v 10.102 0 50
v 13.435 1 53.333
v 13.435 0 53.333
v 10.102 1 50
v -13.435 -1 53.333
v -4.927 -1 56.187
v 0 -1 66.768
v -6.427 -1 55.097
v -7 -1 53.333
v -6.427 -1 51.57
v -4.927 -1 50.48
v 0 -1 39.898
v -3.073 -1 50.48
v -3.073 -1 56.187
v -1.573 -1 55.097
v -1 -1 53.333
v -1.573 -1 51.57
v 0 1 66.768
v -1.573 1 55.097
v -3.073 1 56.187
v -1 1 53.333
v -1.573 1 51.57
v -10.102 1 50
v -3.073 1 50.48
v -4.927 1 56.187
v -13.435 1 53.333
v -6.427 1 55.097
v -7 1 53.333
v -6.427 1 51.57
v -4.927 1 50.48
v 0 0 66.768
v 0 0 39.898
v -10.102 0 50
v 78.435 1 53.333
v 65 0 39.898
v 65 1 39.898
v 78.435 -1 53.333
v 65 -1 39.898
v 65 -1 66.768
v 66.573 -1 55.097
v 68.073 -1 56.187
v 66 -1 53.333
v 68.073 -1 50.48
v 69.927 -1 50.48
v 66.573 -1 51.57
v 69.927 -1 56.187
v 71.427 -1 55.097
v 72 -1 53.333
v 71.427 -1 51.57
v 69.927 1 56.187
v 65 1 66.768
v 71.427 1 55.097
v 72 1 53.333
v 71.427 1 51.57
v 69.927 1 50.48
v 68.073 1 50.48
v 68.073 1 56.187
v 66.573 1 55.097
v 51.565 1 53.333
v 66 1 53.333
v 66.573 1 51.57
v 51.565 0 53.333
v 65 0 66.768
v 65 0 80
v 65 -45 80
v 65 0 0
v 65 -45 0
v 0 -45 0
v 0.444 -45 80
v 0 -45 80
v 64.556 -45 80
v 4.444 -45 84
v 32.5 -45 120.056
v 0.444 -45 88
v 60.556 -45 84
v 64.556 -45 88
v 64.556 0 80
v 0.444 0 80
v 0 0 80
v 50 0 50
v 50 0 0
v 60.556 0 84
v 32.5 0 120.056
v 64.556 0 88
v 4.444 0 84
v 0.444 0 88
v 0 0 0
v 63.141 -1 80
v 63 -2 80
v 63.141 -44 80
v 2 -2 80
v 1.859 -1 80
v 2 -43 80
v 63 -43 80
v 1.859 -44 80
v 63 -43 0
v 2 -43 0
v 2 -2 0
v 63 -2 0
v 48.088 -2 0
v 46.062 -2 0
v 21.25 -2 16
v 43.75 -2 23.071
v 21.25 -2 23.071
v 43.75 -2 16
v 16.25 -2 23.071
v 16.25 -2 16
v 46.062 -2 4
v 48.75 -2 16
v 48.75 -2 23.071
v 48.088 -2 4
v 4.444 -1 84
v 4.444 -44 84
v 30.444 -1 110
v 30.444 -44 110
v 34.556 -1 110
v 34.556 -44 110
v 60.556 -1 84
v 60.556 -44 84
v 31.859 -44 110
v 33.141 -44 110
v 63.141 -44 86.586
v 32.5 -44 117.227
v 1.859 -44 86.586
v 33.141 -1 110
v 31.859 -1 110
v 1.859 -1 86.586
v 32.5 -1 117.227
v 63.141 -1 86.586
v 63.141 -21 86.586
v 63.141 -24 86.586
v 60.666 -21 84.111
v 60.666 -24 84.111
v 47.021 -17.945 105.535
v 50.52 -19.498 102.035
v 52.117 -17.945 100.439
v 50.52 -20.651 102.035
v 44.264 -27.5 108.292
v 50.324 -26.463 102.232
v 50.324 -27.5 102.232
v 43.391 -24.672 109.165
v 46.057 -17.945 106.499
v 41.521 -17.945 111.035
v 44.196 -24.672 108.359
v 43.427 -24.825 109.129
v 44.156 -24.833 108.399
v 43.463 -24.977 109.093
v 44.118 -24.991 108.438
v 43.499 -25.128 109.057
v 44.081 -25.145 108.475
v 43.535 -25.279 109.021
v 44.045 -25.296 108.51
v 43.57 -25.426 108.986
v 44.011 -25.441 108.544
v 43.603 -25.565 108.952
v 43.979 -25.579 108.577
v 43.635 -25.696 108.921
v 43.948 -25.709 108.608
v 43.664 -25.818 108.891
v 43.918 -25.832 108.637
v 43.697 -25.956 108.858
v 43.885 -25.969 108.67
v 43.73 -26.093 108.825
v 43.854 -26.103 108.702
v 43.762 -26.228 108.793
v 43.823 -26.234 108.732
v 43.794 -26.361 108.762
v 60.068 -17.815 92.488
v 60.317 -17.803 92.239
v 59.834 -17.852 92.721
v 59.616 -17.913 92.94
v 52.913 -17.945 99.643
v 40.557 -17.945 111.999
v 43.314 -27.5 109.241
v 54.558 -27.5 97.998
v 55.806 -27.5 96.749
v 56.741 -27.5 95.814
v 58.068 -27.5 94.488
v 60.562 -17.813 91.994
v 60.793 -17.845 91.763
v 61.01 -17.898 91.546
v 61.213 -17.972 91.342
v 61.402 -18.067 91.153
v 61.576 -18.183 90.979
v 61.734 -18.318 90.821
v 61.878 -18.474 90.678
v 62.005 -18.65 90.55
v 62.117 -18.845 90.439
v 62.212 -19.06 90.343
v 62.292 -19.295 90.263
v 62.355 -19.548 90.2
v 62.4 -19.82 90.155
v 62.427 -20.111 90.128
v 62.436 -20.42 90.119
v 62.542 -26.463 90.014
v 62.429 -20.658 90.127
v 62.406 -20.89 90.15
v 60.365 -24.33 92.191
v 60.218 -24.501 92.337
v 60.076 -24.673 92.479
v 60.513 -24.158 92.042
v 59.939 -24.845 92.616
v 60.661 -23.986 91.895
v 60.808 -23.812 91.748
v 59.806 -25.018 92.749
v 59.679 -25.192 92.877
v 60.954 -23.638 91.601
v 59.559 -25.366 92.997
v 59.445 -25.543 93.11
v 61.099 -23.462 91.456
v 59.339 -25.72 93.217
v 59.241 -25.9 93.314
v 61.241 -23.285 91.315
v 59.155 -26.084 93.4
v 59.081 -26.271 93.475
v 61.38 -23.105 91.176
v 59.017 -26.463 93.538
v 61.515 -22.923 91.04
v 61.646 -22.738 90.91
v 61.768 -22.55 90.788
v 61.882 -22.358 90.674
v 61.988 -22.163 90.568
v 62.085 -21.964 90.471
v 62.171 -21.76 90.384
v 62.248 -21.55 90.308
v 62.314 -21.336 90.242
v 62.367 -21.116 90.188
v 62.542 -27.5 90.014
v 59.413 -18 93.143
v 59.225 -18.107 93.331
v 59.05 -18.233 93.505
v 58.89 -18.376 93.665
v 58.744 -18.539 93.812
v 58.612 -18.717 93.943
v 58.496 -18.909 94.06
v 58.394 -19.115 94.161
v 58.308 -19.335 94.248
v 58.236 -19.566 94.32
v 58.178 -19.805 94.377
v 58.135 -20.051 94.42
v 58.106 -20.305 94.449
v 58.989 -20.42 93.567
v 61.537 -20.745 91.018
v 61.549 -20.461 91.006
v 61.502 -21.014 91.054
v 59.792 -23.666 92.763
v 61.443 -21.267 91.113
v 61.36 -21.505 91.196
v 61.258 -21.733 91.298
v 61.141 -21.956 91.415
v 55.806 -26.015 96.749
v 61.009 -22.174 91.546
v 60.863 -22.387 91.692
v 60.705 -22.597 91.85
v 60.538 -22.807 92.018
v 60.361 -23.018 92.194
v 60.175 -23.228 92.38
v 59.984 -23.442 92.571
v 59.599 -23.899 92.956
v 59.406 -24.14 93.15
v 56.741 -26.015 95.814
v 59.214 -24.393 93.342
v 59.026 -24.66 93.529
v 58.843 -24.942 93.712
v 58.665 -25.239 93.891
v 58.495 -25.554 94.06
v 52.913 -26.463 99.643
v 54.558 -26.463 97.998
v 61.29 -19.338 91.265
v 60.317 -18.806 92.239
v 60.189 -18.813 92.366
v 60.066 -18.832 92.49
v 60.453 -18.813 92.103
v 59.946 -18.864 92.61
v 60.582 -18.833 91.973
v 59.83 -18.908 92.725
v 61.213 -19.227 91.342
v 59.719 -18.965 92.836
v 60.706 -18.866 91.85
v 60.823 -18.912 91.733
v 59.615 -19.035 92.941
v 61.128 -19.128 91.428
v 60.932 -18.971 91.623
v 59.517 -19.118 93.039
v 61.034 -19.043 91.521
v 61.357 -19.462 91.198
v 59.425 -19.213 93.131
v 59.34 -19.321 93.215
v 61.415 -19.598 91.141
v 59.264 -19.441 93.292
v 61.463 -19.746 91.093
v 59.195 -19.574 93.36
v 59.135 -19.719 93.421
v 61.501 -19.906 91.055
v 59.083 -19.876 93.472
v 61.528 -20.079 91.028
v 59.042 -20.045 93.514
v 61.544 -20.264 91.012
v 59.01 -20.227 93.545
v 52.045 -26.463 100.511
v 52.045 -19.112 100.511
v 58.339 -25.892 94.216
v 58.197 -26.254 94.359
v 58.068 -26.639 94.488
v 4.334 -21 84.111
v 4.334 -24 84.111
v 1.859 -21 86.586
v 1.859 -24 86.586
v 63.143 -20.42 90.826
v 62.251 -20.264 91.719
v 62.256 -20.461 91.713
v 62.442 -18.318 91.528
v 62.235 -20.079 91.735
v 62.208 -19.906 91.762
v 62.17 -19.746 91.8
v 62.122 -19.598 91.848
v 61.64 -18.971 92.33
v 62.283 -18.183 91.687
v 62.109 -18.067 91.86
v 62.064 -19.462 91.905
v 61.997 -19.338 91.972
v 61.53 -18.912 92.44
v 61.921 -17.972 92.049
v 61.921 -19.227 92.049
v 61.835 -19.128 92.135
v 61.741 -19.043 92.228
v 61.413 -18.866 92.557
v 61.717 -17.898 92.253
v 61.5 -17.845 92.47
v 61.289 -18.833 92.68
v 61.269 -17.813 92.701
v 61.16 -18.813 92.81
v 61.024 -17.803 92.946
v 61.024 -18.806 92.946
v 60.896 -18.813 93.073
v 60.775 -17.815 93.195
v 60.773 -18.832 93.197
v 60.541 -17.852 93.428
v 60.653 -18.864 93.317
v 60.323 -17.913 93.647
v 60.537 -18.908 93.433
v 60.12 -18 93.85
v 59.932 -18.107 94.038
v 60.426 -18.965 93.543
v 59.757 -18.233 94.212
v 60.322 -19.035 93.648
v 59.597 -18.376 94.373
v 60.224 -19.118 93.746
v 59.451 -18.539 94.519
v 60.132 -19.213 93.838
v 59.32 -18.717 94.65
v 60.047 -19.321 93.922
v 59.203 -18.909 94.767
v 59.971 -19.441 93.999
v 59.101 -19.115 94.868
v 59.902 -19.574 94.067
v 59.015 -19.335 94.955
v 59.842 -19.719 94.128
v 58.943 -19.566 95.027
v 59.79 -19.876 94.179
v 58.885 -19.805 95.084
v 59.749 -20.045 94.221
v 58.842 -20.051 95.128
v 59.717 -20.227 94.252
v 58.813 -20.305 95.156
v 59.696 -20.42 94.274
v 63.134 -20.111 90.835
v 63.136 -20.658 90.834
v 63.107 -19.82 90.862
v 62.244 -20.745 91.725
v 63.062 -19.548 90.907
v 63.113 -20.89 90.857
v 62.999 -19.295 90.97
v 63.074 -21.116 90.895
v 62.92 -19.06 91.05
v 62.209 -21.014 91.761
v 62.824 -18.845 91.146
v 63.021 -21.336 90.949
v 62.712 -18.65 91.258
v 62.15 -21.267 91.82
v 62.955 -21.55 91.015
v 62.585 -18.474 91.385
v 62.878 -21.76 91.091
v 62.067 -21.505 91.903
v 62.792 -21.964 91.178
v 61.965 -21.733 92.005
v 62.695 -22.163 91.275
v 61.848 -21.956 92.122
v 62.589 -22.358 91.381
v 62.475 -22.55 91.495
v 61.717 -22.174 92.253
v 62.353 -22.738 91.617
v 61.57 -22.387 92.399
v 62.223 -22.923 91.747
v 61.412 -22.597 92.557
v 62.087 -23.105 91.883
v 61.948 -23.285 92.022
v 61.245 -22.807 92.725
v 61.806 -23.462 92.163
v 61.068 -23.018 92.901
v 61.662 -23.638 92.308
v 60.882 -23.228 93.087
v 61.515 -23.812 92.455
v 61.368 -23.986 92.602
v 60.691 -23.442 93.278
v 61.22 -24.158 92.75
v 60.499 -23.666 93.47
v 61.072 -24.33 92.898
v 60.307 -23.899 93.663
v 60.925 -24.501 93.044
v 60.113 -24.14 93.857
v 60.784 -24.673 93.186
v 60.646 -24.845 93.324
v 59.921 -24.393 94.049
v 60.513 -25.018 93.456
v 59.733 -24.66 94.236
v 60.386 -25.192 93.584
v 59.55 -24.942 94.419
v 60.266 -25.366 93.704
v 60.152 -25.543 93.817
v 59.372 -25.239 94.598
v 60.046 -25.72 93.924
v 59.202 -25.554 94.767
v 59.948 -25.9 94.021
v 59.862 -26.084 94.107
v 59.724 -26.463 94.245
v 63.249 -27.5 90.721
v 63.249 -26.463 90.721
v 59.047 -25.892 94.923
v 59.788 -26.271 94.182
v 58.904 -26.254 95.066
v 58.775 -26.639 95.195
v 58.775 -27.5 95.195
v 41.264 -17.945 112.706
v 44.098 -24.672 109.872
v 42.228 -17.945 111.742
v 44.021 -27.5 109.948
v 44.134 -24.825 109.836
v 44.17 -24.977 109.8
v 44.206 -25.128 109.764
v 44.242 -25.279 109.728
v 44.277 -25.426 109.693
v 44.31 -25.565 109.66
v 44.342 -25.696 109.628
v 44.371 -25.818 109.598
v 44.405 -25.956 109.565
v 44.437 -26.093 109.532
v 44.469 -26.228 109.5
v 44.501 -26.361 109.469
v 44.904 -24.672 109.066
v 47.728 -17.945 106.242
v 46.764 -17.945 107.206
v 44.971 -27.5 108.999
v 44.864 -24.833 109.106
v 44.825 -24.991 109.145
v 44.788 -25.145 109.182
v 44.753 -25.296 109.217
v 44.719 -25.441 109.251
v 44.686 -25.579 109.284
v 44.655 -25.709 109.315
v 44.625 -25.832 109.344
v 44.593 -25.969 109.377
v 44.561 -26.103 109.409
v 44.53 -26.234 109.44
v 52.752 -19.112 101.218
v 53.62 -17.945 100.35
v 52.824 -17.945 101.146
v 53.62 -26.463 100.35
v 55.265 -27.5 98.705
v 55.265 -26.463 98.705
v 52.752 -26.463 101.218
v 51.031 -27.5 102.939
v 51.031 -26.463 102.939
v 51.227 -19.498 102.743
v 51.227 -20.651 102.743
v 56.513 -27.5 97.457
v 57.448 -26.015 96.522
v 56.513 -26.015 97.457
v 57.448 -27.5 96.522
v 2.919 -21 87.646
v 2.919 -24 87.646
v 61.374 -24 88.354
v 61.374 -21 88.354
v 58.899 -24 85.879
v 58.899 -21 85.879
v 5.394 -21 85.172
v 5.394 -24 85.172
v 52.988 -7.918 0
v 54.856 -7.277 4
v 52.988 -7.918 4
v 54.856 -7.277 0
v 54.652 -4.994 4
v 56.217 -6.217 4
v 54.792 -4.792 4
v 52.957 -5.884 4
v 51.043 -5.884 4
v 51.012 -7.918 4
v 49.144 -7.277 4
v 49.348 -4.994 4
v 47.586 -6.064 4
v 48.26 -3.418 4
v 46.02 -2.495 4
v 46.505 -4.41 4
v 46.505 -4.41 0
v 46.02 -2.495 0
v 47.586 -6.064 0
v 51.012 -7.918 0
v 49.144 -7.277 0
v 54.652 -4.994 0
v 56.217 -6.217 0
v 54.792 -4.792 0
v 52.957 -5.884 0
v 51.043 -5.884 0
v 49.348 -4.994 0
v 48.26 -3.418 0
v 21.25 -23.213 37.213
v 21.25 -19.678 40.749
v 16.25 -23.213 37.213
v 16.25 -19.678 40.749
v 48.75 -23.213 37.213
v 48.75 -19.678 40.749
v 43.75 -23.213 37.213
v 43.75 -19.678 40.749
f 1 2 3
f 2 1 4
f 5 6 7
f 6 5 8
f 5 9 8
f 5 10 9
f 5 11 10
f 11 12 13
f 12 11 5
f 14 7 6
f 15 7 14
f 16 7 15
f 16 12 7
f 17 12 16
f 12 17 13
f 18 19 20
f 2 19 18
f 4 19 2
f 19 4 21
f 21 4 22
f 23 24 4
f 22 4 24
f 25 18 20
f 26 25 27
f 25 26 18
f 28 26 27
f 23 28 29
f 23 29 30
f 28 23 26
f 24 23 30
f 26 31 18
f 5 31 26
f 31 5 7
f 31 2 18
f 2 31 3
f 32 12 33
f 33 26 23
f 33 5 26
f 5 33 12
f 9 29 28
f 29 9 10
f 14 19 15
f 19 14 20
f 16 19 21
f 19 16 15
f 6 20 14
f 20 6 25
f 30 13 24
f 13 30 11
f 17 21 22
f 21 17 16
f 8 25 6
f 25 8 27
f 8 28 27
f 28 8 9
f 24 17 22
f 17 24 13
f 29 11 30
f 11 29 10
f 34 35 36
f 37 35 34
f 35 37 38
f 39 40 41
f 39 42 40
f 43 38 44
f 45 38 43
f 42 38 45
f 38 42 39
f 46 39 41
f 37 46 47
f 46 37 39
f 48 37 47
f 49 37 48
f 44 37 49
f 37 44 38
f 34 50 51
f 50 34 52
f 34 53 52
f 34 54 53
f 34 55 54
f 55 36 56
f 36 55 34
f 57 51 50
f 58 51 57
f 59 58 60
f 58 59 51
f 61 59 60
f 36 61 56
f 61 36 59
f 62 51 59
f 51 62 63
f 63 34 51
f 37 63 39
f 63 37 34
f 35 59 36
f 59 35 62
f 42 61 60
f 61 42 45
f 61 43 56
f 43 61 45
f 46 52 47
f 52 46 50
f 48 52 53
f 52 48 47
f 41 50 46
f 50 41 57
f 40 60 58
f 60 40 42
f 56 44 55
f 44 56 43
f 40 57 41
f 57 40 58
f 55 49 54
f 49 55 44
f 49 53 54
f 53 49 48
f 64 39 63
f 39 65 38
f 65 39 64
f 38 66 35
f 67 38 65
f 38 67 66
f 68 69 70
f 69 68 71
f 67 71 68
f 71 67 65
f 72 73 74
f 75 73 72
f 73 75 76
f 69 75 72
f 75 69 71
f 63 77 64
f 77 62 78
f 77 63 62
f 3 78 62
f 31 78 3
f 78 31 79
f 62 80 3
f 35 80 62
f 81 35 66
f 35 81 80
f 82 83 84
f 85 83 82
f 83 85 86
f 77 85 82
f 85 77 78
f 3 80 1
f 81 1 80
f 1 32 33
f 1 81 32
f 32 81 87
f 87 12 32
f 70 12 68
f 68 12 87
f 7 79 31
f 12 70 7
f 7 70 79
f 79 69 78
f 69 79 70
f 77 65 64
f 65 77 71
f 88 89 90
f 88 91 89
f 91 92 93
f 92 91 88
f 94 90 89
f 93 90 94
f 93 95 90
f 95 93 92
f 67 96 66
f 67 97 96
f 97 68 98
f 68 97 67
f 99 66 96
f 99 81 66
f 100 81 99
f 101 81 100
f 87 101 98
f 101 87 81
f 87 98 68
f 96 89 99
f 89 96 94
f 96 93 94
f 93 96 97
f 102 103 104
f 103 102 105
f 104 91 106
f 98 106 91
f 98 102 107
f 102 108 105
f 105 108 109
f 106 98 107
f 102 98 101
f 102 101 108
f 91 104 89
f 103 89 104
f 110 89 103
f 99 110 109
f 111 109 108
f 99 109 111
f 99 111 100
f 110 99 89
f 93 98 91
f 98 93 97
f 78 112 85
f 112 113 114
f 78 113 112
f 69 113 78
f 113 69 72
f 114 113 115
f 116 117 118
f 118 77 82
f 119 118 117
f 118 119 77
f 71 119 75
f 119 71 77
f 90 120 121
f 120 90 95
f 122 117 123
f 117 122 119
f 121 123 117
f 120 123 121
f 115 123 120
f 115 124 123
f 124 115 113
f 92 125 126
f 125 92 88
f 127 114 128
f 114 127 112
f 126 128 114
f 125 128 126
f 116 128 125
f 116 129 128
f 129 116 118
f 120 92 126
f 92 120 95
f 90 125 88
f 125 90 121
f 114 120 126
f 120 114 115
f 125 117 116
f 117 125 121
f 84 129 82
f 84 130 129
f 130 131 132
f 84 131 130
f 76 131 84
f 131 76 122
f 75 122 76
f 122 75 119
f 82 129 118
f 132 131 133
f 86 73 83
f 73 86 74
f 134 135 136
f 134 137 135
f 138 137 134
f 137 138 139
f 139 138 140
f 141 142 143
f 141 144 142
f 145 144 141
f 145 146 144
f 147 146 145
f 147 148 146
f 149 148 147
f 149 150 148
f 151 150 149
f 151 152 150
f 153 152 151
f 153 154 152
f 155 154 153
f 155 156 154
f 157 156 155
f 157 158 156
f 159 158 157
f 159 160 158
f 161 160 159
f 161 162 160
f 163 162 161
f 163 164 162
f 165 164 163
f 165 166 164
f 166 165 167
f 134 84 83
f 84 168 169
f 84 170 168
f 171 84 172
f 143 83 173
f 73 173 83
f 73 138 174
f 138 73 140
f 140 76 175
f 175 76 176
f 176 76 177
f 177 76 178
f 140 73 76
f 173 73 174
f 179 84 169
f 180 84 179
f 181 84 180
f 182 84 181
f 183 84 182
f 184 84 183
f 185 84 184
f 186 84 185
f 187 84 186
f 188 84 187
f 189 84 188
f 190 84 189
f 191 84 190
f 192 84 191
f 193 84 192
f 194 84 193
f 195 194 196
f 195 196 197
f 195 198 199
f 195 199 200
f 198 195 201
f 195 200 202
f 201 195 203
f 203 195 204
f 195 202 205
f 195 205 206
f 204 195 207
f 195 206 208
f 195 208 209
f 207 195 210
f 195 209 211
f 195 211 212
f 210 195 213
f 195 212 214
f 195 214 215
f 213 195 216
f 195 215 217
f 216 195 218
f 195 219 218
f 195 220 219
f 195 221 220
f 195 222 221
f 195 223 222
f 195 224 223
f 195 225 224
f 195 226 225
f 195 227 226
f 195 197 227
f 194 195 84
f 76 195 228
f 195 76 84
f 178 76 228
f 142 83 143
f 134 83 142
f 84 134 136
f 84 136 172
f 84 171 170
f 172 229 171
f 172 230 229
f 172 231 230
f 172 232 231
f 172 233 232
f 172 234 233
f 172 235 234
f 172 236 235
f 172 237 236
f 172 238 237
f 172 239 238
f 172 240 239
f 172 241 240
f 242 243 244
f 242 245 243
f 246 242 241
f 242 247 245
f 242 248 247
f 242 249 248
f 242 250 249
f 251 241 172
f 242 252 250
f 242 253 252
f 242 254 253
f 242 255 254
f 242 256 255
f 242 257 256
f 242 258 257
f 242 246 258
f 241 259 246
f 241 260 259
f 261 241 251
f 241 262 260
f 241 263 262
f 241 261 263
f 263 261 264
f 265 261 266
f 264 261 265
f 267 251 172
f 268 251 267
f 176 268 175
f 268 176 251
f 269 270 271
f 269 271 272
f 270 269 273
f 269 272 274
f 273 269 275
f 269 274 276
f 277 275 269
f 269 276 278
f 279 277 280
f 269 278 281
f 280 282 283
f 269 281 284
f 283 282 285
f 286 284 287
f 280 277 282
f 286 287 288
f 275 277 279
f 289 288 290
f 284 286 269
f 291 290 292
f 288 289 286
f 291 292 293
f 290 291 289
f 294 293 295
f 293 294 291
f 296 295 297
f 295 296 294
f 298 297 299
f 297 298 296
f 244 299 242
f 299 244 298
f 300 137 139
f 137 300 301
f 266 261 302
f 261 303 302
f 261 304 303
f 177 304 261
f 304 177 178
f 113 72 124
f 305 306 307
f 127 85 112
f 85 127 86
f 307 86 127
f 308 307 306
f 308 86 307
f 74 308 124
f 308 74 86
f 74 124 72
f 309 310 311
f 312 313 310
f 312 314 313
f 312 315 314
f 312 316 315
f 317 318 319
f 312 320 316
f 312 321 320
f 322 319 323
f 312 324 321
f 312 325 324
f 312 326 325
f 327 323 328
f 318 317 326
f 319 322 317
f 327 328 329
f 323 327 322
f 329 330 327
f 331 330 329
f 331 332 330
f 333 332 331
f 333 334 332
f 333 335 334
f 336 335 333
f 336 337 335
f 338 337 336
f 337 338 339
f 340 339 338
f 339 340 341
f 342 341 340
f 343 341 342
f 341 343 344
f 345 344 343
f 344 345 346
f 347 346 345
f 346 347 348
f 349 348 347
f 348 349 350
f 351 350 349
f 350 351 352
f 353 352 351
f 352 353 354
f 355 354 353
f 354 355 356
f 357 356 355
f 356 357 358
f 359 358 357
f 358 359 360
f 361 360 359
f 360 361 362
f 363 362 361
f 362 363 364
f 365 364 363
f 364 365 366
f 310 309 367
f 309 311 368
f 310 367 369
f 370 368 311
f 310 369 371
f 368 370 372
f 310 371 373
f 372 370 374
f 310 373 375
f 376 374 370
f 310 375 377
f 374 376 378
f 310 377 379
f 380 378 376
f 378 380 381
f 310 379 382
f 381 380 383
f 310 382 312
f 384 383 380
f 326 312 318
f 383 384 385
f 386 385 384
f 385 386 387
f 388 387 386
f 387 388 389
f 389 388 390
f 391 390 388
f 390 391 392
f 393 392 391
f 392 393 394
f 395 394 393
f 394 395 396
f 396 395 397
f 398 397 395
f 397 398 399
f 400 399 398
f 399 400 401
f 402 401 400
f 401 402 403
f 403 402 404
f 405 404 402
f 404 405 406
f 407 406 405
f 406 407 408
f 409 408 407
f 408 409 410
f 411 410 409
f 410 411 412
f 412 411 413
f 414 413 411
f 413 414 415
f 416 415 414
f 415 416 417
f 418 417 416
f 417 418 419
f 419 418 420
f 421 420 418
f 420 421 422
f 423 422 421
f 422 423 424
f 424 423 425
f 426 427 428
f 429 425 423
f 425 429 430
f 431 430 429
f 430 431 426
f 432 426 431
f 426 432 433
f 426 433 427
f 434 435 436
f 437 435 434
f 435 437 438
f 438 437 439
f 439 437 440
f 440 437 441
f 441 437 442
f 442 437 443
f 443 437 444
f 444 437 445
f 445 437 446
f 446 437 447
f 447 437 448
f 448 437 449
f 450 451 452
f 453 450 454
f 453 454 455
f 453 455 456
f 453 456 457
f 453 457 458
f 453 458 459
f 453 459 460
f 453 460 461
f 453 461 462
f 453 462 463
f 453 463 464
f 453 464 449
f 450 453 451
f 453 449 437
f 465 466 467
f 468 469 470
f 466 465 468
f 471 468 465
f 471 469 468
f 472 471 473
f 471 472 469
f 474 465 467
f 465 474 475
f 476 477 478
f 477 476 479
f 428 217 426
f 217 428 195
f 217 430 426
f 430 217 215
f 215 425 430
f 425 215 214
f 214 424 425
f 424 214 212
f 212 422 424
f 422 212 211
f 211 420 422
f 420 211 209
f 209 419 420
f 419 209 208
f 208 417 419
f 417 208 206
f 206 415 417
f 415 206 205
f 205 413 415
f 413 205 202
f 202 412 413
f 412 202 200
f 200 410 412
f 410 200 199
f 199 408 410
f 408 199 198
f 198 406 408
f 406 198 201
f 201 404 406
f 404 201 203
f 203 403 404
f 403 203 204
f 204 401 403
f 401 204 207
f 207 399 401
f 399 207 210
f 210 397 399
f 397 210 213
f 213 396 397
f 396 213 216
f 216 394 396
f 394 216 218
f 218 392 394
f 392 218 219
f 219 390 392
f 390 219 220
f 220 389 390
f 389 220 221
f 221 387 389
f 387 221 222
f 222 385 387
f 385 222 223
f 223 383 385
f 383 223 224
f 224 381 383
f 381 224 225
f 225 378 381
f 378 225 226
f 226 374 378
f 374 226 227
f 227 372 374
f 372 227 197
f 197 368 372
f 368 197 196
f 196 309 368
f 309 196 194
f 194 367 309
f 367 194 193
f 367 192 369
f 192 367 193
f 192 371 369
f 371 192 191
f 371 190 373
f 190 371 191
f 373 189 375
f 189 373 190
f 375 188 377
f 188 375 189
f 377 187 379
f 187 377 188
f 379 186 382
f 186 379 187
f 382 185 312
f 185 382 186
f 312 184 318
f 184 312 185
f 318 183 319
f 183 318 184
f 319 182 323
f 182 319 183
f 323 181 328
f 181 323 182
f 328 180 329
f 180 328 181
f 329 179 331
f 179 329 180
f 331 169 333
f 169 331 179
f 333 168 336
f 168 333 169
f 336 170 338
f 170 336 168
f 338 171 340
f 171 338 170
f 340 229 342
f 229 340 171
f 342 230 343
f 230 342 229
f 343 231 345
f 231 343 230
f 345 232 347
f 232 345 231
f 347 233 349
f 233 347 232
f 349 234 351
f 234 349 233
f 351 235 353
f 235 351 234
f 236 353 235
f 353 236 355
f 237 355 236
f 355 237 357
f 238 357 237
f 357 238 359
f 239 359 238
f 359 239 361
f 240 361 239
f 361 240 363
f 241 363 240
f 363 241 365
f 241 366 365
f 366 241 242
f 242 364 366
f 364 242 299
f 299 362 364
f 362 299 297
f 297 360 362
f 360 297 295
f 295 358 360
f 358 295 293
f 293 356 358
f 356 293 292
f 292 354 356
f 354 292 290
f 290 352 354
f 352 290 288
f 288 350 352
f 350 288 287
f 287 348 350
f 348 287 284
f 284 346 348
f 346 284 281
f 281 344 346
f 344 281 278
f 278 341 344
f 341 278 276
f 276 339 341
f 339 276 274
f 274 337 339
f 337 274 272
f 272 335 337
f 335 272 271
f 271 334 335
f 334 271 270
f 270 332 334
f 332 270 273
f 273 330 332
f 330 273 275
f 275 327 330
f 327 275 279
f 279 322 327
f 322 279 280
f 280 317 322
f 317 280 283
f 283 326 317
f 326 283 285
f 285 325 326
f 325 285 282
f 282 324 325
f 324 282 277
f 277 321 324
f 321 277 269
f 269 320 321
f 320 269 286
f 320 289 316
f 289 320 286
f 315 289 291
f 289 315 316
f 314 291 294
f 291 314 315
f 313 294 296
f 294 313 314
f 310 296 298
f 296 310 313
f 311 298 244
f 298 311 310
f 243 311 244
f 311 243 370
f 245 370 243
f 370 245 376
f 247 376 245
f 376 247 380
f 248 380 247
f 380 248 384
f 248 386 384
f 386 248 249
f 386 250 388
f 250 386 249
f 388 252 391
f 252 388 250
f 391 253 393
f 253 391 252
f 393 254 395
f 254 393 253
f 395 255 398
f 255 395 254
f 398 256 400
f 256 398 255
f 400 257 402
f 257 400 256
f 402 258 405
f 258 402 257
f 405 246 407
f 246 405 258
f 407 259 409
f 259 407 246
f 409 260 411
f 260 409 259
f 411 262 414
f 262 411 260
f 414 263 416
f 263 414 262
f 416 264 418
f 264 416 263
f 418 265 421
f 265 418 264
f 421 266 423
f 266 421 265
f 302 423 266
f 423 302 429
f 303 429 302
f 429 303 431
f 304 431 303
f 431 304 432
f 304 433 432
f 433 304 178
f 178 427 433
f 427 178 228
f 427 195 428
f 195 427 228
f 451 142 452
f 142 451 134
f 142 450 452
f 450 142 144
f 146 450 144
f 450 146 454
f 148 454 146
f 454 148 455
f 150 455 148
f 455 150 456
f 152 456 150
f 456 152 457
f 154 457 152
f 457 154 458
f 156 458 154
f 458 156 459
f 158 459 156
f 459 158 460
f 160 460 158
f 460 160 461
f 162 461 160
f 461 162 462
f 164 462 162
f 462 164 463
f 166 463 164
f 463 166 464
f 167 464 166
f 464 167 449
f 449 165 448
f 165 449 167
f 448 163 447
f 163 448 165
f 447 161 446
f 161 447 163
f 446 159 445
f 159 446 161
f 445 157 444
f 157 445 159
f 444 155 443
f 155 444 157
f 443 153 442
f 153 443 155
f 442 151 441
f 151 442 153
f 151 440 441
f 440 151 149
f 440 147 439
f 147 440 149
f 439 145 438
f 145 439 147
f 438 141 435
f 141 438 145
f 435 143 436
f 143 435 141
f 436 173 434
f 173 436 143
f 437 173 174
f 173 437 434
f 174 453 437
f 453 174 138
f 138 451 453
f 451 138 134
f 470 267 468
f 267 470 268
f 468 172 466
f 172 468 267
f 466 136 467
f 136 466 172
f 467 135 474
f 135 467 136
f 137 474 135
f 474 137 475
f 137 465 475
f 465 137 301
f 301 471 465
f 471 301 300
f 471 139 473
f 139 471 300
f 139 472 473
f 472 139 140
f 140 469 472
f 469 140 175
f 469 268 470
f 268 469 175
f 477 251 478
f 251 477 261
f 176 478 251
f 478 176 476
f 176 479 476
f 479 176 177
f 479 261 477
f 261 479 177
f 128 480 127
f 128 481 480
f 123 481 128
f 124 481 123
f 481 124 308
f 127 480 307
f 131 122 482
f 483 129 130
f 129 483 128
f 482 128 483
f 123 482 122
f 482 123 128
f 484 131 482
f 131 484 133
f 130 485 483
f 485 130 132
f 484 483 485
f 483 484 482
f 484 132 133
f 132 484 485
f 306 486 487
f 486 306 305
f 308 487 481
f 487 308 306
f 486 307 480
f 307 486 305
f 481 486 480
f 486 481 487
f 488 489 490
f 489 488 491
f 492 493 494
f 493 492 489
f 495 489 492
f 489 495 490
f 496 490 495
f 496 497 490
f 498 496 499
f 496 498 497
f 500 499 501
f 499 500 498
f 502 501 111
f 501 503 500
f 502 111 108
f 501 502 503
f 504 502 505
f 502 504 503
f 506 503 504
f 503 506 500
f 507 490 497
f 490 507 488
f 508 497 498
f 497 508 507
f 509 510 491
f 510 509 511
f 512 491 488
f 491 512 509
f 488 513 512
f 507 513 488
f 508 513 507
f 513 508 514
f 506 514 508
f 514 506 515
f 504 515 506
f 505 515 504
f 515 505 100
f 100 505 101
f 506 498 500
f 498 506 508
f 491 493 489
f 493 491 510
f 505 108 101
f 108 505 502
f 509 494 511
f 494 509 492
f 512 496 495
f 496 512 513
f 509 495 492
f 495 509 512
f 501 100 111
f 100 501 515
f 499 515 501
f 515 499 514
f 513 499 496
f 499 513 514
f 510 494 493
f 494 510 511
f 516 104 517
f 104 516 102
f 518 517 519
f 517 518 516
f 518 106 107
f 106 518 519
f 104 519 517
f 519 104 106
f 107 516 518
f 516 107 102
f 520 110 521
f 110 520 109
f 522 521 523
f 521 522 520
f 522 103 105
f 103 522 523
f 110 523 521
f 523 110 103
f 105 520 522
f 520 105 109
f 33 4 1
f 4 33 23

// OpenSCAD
width = 65;
length = 80;
height = 45;
thickness = 2;




difference(){
rotate([90,0,0])
{
difference(){
    union(){
        //Main outer cube which contains the sensor.
        cube(size = [width, length, height],center=false);
        
        //Infästningen vänster sida
        difference(){
           translate(v=[0,2*length/3,0])
            
           rotate([0,0,-45])
           cube(size = [19, 19, thickness],center=true);
           //hole
           translate(v=[-4,2*length/3,0])
           cylinder(h = thickness+1, r=3, center = true);
        }

        //Infästning höger sida
        difference(){
            translate(v=[width,2*length/3,0])
            rotate([0,0,-45])
            cube(size = [19,19, thickness],center=true);
            //hole
            translate(v=[width+4,2*length/3,0])
            cylinder(h = thickness+1, r=3, center = true);
        }
    }
    translate(v = [thickness,0,thickness], center = false)
    cube(size = [width-2*thickness, length, height-2*thickness],center=false);
}

    //translate(v=[0,-29,length+23])
 /*   
rotate([-90,0,40])
translate(v=[width/2,-height/2,length])
   linear_extrude(height = 1, center = true){
text("V 1.2", center=true);

   }*/
altWidth=2*width/3+2;
translate(v=[width/2,length,0])
 translate(v=[0,0,height/2])
{
    rotate([0,0,-90]){
        union(){
            difference(){
                rotate([0,0,45]){
                    difference(){
                        cube(size =[altWidth, altWidth,height], center = true);
                        cube(size =[altWidth -2, altWidth-2,height-2], center = true);
                    }
                }
 union(){
    translate(v=[width/2,0,0])
    cube(size =[width, width,height], center = true);
    translate(v=[-width/2-30,0,0])
    cube(size =[width, width,height], center = true);
   }
   
 }
 
 
 
 
 
 
 translate(v=[-8,0,0])
 rotate([0,0,45])
    {
     difference()
     {
        union(){
             //Top cube witch creates a ventilation shaft.
             cube(size =[altWidth, altWidth,height], center = true);
             //Text
             translate(v=[-altWidth/4,altWidth/2,5])
             rotate([-90,0,0])
             linear_extrude(height = 2, center = true){
                 text("V 1.2", center=true);
             }
             



         }
         translate(v=[2,-2,0])
         difference(){
         cube(size =[altWidth , altWidth,height-2], center = true);
             //Support for ventilation holes - right side
            translate(v=[altWidth/2-3,altWidth/2,0])
            cube(size = [3, 7, 3],center=true);
            //Support for ventilation holes - left side
            translate(v=[-altWidth/2,-altWidth/2-3,0])
            cube(size = [7, 13, 3],center=true);
         }
     }
    }
 }
 }
}









// Pinnarna i boxen
translate(v=[width/4,length/5,thickness])
rotate([-45,0,0])
cube(size=[5,5,height-15], center = false);
 
translate(v=[3*width/4-5,length/5,thickness])
rotate([-45,0,0])
cube(size=[5,5,height-15], center = false);
 
/*
translate(v=[width/2-10,5,thickness])
rotate([-45,45,0])
cube(size=[3,2,15], center = false);
 
translate(v=[width/2+10,15,0])
rotate([-45,-45,0])
cube(size=[3,2,15], center = false);
*/

translate(v=[4*width/5,4,thickness])
rotate([90,90,0])
difference(){
difference(){
    cylinder(h=4,r=6, center = false);
    cylinder(h=4,r=4, center = false);
}
union(){
translate(v=[0,-width/2,0])
cube(size=[width,width,10], center =false);

rotate(-45,0,0)
translate(v=[-width/2-2,0,0])
cube(size=[width,width,10], center =false);

}
}




}
translate(v=[0,5,0])
 cube(size = [100,10,100],center=true);
}
 
